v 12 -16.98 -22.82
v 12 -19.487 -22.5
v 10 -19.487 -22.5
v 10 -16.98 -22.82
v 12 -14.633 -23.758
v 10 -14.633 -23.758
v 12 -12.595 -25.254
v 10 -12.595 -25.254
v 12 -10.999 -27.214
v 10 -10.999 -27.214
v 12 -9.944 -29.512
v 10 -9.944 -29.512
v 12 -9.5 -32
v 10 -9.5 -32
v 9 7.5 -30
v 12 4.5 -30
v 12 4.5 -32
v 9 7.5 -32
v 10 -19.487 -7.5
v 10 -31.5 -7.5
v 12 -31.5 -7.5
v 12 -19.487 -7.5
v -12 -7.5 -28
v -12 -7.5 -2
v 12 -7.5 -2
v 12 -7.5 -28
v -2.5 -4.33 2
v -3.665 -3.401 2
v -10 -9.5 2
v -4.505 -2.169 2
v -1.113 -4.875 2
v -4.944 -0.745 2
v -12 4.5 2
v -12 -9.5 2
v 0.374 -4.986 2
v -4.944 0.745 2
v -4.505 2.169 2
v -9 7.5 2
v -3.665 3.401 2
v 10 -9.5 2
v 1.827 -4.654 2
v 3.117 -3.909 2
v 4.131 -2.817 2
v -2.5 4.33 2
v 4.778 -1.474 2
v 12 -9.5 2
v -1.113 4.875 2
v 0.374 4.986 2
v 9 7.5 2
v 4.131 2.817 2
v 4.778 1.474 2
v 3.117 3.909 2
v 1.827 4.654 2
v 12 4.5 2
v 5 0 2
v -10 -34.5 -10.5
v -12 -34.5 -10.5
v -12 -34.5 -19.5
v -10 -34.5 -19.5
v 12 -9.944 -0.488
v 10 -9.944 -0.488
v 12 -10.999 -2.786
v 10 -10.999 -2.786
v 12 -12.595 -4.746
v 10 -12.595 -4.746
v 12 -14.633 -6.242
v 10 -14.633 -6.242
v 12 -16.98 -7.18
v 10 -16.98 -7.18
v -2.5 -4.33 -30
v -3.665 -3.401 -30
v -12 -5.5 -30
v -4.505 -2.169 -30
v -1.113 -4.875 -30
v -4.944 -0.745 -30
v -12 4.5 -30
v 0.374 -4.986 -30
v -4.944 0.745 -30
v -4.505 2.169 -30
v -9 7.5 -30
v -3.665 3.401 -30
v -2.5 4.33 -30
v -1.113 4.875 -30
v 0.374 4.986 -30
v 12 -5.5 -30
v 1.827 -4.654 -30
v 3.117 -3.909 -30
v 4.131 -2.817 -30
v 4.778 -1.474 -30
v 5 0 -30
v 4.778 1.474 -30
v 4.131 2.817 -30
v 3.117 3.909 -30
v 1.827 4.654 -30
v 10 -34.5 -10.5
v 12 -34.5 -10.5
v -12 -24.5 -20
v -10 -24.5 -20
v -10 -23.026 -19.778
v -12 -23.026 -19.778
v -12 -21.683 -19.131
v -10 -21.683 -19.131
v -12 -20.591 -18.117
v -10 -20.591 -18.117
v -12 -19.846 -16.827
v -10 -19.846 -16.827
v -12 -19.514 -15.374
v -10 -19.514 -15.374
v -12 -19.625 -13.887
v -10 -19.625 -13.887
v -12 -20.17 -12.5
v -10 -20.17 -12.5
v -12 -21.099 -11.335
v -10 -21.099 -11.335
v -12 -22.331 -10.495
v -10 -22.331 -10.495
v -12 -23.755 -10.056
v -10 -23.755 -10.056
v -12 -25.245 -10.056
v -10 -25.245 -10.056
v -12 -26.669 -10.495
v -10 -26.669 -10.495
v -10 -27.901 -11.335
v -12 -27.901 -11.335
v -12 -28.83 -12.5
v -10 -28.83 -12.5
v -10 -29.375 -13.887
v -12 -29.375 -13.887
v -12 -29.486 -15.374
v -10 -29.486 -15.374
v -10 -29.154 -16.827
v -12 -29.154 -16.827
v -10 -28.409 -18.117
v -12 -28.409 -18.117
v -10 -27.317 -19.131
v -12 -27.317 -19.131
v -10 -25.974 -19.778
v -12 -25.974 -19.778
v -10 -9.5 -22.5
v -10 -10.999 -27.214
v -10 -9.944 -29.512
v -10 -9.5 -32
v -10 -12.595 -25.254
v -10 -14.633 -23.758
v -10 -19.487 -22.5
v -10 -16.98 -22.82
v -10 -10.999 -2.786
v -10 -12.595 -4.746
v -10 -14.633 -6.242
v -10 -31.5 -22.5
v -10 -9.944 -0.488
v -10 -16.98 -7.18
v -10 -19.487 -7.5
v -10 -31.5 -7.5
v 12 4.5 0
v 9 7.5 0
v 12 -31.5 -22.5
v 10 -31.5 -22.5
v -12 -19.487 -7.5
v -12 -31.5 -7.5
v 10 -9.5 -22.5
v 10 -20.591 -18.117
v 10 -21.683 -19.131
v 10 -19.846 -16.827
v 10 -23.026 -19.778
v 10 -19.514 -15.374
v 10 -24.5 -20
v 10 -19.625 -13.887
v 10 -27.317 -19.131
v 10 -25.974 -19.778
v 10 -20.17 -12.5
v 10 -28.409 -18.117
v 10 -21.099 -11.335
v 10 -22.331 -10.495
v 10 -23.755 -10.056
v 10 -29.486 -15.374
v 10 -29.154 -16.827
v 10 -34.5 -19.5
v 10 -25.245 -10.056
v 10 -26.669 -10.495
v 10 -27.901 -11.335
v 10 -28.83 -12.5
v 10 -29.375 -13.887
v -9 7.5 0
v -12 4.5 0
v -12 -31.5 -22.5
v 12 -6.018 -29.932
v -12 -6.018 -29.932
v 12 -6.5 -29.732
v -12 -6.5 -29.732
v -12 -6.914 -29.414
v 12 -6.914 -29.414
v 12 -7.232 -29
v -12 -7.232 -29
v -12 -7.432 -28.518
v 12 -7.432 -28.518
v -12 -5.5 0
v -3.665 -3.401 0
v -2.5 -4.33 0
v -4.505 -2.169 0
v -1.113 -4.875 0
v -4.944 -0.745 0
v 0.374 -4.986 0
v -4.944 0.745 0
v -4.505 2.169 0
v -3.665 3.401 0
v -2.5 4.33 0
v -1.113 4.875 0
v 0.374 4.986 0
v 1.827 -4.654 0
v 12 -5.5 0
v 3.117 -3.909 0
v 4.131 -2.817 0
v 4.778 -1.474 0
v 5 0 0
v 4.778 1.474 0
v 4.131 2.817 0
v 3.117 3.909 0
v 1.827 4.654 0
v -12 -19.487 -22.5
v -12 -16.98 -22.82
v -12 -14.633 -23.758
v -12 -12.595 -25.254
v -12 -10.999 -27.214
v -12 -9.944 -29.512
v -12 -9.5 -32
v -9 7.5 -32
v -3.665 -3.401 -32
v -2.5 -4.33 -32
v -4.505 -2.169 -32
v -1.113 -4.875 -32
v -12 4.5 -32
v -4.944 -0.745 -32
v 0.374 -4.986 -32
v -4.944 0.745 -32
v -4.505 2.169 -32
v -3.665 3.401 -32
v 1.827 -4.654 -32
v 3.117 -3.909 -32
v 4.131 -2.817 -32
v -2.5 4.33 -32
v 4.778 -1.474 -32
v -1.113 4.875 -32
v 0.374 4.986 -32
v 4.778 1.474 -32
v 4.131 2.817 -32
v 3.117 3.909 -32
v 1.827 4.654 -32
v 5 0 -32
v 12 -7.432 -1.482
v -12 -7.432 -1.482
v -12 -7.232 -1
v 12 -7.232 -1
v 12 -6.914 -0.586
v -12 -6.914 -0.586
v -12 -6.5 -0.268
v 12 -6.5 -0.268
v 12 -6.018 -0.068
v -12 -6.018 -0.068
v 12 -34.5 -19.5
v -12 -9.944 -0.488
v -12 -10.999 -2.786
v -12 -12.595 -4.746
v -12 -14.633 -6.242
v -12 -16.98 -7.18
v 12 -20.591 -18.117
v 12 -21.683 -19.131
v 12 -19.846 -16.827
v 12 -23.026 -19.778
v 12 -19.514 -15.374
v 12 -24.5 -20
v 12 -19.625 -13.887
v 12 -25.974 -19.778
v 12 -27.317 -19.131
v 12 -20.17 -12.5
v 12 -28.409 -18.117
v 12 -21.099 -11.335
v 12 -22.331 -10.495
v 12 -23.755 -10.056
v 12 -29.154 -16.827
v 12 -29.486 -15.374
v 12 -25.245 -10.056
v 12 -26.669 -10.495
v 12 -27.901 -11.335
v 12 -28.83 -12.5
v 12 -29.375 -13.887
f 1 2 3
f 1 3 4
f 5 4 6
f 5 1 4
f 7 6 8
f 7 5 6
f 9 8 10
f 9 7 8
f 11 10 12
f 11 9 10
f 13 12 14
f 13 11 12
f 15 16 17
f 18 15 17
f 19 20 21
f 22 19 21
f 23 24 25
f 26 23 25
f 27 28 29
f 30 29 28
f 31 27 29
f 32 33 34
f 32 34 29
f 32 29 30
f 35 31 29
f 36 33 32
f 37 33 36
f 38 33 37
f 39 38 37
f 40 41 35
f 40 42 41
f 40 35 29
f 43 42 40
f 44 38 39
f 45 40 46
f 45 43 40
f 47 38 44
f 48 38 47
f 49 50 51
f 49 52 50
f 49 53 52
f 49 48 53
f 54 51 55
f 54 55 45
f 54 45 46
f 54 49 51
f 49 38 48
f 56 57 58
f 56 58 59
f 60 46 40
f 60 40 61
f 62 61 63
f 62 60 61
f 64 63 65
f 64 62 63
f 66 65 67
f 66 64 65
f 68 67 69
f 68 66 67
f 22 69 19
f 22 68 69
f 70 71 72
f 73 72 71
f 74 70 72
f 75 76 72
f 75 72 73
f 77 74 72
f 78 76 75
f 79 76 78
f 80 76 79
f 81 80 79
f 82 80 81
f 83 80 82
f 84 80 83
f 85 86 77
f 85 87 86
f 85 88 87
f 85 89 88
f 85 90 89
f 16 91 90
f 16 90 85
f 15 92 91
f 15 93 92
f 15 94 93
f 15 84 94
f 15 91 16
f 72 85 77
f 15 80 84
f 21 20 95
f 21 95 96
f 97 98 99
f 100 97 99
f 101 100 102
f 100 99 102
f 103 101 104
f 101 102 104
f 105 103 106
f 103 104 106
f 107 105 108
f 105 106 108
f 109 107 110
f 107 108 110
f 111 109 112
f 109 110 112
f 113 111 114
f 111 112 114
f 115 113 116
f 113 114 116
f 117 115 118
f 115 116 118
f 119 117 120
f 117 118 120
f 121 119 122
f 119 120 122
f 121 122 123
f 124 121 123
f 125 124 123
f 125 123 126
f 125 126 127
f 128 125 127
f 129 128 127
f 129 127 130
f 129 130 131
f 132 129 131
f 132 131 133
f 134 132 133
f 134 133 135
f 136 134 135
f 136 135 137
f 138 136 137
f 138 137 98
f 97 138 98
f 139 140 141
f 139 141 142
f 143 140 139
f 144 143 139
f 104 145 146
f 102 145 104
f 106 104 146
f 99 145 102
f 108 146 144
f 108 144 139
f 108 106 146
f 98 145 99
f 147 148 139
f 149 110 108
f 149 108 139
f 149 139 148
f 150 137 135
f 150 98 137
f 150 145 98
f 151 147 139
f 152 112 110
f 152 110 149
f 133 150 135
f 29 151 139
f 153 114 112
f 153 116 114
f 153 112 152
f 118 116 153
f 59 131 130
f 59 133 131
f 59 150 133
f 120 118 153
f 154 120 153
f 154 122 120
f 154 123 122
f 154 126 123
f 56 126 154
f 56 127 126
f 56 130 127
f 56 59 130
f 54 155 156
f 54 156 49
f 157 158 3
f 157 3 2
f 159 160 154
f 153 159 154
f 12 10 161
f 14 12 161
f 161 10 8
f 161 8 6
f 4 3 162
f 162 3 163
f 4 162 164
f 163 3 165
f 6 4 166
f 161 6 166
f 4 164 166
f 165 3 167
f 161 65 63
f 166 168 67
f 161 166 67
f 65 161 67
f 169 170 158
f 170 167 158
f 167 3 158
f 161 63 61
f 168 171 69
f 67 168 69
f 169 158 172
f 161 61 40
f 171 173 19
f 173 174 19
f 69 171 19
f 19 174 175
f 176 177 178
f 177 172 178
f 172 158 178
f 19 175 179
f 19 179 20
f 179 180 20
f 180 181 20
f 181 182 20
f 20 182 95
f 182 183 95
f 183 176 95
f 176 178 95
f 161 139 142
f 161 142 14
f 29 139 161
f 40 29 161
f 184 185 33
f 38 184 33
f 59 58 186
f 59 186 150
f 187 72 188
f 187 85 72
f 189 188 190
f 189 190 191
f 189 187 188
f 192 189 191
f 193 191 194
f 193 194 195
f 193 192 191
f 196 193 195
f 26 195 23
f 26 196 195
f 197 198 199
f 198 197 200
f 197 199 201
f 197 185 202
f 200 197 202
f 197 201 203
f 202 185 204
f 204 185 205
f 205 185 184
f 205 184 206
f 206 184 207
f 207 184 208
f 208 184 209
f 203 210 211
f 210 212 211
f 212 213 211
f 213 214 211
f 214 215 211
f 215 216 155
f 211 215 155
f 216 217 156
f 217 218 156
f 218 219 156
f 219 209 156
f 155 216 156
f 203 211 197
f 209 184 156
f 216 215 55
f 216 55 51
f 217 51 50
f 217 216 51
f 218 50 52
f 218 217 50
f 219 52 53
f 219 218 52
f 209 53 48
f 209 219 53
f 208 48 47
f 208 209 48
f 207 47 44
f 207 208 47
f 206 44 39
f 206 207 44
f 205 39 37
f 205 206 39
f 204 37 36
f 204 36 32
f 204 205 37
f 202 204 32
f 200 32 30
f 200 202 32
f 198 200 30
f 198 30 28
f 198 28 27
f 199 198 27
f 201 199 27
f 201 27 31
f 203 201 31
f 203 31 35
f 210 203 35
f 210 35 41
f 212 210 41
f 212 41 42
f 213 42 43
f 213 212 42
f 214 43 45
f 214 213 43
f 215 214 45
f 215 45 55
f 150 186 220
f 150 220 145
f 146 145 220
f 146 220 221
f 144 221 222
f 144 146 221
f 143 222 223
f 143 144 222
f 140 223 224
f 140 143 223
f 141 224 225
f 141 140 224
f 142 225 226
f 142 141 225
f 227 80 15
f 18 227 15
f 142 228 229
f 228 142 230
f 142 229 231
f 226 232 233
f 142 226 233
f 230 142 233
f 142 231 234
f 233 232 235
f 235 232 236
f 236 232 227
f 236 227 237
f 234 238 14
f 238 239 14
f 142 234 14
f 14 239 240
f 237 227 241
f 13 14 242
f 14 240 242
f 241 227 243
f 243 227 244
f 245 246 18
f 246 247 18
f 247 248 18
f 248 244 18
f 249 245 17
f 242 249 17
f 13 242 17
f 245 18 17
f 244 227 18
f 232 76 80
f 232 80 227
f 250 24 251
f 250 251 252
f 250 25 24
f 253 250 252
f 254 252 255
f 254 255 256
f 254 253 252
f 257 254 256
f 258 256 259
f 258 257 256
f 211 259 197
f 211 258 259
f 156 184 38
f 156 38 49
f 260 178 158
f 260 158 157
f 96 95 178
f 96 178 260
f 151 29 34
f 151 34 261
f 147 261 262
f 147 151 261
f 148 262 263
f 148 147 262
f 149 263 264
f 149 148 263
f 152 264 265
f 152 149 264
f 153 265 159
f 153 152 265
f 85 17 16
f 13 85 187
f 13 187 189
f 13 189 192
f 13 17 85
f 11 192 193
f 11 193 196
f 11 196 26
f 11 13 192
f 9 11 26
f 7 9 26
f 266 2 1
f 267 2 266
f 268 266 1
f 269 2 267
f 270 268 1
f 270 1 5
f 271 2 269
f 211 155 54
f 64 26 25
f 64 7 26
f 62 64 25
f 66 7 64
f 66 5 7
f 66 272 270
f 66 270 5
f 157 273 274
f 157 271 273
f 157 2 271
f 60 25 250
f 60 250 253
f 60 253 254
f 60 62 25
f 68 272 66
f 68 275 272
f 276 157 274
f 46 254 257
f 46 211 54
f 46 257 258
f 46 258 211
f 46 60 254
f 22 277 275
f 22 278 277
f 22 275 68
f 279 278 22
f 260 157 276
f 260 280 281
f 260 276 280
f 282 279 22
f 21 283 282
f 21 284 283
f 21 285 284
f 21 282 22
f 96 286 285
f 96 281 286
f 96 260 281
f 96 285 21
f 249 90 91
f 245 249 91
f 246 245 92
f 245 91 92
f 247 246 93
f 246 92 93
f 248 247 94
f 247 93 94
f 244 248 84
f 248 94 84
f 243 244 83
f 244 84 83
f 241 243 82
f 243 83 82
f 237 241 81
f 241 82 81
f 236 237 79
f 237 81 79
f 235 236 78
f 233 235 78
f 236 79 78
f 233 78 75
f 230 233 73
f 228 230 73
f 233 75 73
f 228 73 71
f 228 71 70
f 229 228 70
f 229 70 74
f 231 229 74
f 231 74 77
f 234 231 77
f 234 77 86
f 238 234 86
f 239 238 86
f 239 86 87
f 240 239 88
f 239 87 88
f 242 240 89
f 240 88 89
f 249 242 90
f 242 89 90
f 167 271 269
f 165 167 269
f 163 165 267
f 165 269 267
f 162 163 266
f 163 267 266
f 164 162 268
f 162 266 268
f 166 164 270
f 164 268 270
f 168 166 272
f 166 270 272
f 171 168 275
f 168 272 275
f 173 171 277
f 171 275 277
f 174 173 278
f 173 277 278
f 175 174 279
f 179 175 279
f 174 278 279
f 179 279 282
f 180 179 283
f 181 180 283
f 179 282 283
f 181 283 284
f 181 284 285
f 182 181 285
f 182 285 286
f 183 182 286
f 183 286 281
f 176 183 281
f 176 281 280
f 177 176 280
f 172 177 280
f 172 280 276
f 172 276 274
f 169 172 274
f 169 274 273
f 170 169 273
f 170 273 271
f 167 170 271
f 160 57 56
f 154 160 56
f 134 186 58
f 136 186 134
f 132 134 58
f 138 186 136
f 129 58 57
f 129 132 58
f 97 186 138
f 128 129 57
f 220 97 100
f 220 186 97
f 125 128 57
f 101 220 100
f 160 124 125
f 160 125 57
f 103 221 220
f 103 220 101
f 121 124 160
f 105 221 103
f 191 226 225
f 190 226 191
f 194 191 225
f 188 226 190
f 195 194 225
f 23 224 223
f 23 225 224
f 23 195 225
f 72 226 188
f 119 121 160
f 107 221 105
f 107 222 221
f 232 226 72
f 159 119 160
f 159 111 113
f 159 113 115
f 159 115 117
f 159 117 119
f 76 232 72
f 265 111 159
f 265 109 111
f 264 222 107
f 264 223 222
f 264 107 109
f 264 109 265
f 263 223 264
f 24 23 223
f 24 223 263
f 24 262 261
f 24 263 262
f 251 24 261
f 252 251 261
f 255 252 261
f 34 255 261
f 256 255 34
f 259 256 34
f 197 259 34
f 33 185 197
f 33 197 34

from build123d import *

# Parameters (mm, degrees)
SKETCH1_W           = 24
SKETCH1_H           = 15
SKETCH1_R           = 5
SKETCH1_H_2         = 2
BOSS_EXTRUDE1_DEPTH = 2
SKETCH1_3_W         = 24
SKETCH1_3_H         = 2
BOSS_EXTRUDE2_DEPTH = 30
SKETCH3_W           = 2
SKETCH3_H           = 34
BOSS_EXTRUDE3_DEPTH = 25
SKETCH4_W           = 2
SKETCH4_H           = 9.5
CUT_EXTRUDE1_DEPTH  = 25
SKETCH5_R           = 5
CUT_EXTRUDE2_DEPTH  = 64.437930135
FILLET1_R           = 10
FILLET2_R           = 2
CHAMFER1_SIZE       = 3


with BuildPart() as part:
    # Sketch1 → Boss-Extrude1 (new body)
    # profile 1 of 2: a face of its own
    with BuildSketch(Plane.XY):
        Rectangle(SKETCH1_W, SKETCH1_H)
        Circle(SKETCH1_R, mode=Mode.SUBTRACT)
    # profile 2 of 2: a face of its own
    with BuildSketch(Plane.XY):
        with Locations((0, -8.5)):
            Rectangle(SKETCH1_W, SKETCH1_H_2)
    boss_extrude1 = extrude(amount=BOSS_EXTRUDE1_DEPTH)

    # Sketch1<3> → Boss-Extrude2 (add)
    with BuildSketch(Plane.XY):
        with Locations((0, -8.5)):
            Rectangle(SKETCH1_3_W, SKETCH1_3_H)
    extrude(amount=-BOSS_EXTRUDE2_DEPTH)

    # Mirror1: Boss-Extrude1 across plane
    add(boss_extrude1.mirror(Plane(origin=(0, 0, -15), x_dir=(1, 0, 0), z_dir=(0, 0, -1))))

    # Sketch3 → Boss-Extrude3 (add)
    with BuildSketch(Plane.XZ.offset(9.5)):
        with Locations((-11, -15)):
            Rectangle(SKETCH3_W, SKETCH3_H)
        with Locations((11, -15)):
            Rectangle(SKETCH3_W, SKETCH3_H)
    extrude(amount=BOSS_EXTRUDE3_DEPTH)

    # Sketch4 → Cut-Extrude1 (cut)
    with BuildSketch(Plane.XZ.offset(34.5)):
        with Locations((-11, -27.25)):
            Rectangle(SKETCH4_W, SKETCH4_H)
        with Locations((-11, -2.75)):
            Rectangle(SKETCH4_W, SKETCH4_H)
        with Locations((11, -2.75)):
            Rectangle(SKETCH4_W, SKETCH4_H)
        with Locations((11, -27.25)):
            Rectangle(SKETCH4_W, SKETCH4_H)
    extrude(amount=-CUT_EXTRUDE1_DEPTH, mode=Mode.SUBTRACT)

    # Sketch5 → Cut-Extrude2 (cut)
    with BuildSketch(Plane(origin=(12, 0, 0), x_dir=(0, 0, -1), z_dir=(1, 0, 0))):
        with Locations((15, -24.5)):
            Circle(SKETCH5_R)
    extrude(amount=-CUT_EXTRUDE2_DEPTH, mode=Mode.SUBTRACT)

    # Fillet1
    # the kernel refuses this fillet: 10 mm, written as the material it adds along each edge
    with BuildSketch(Plane(origin=(12, -9.5, -7.5), x_dir=(0, 0, 1), z_dir=(-1, 0, 0)), Plane(origin=(-10, -9.5, -7.5), x_dir=(0, 0, 1), z_dir=(-1, 0, 0))) as fillet1_piece_1:
        with BuildLine():
            CenterArc((10, -9.987492178), FILLET1_R, 92.865983983, 87.134016017)
            Line((0, -9.987492178), (-0.2, -9.987492178))
            Line((-0.2, -9.987492178), (-0.2, 0))
            Line((-0.2, 0), (0, 0.2))
            ThreePointArc((0, 0.2), (4.75, 0.2), (9.49, 0.199749844))
            Line((9.49, 0.199749844), (9.5, 0))
        make_face()
    extrude(amount=2)
    with BuildSketch(Plane(origin=(12, -9.5, -7.5), x_dir=(0, 0, 1), z_dir=(-1, 0, 0))) as fillet1_piece_2_section:
        with BuildLine():
            CenterArc((10, -9.987492178), FILLET1_R, 92.865983983, 87.134016017)
            Line((0, -9.987492178), (-0.2, -9.987492178))
            Line((-0.2, -9.987492178), (-0.2, 0))
            Line((-0.2, 0), (0, 0.2))
            ThreePointArc((0, 0.2), (4.75, 0.2), (9.49, 0.199749844))
            Line((9.49, 0.199749844), (9.5, 0))
        make_face()
    fillet1_piece_2 = extrude(amount=26.968730444, mode=Mode.PRIVATE)
    fillet1_piece_2 = split(fillet1_piece_2, bisect_by=Plane(origin=(-12, -11.774818107, -5.276261627), z_dir=(1, 0, 0)), keep=Keep.TOP, mode=Mode.PRIVATE)
    fillet1_piece_2 = split(fillet1_piece_2, bisect_by=Plane(origin=(-10, -11.774818107, -5.276261627), z_dir=(-1, 0, 0)), keep=Keep.TOP, mode=Mode.PRIVATE)
    add(fillet1_piece_2)
    with BuildSketch(Plane(origin=(12, -9.5, -22.5), x_dir=(0, 0, -1), z_dir=(-1, 0, 0)), Plane(origin=(-10, -9.5, -22.5), x_dir=(0, 0, -1), z_dir=(-1, 0, 0))) as fillet1_piece_3:
        with BuildLine():
            CenterArc((10, 9.987492178), FILLET1_R, 180, 87.134016017)
            Line((0, 9.987492178), (-0.2, 9.987492178))
            Line((-0.2, 9.987492178), (-0.2, 0))
            Line((-0.2, 0), (0, -0.2))
            ThreePointArc((0, -0.2), (4.75, -0.2), (9.49, -0.199749844))
            Line((9.49, -0.199749844), (9.5, 0))
        make_face()
    extrude(amount=2)
    with BuildSketch(Plane(origin=(12, -9.5, -22.5), x_dir=(0, 0, -1), z_dir=(-1, 0, 0))) as fillet1_piece_4_section:
        with BuildLine():
            CenterArc((10, 9.987492178), FILLET1_R, 180, 87.134016017)
            Line((0, 9.987492178), (-0.2, 9.987492178))
            Line((-0.2, 9.987492178), (-0.2, 0))
            Line((-0.2, 0), (0, -0.2))
            ThreePointArc((0, -0.2), (4.75, -0.2), (9.49, -0.199749844))
            Line((9.49, -0.199749844), (9.5, 0))
        make_face()
    fillet1_piece_4 = extrude(amount=26.968730444, mode=Mode.PRIVATE)
    fillet1_piece_4 = split(fillet1_piece_4, bisect_by=Plane(origin=(-12, -11.774818107, -24.723738373), z_dir=(1, 0, 0)), keep=Keep.TOP, mode=Mode.PRIVATE)
    fillet1_piece_4 = split(fillet1_piece_4, bisect_by=Plane(origin=(-10, -11.774818107, -24.723738373), z_dir=(-1, 0, 0)), keep=Keep.TOP, mode=Mode.PRIVATE)
    add(fillet1_piece_4)
    with BuildSketch(Plane(origin=(14.968730444, -9.5, -22.5), x_dir=(0, 0, -1), z_dir=(-1, 0, 0))) as fillet1_piece_5_section:
        with BuildLine():
            CenterArc((10, 9.987492178), FILLET1_R, 180, 87.134016017)
            Line((0, 9.987492178), (-0.2, 9.987492178))
            Line((-0.2, 9.987492178), (-0.2, 0))
            Line((-0.2, 0), (0, -0.2))
            ThreePointArc((0, -0.2), (4.75, -0.2), (9.49, -0.199749844))
            Line((9.49, -0.199749844), (9.5, 0))
        make_face()
    fillet1_piece_5 = extrude(amount=26.968730444, mode=Mode.PRIVATE)
    fillet1_piece_5 = split(fillet1_piece_5, bisect_by=Plane(origin=(12, -11.774818107, -24.723738373), z_dir=(-1, 0, 0)), keep=Keep.TOP, mode=Mode.PRIVATE)
    fillet1_piece_5 = split(fillet1_piece_5, bisect_by=Plane(origin=(10, -11.774818107, -24.723738373), z_dir=(1, 0, 0)), keep=Keep.TOP, mode=Mode.PRIVATE)
    add(fillet1_piece_5)
    with BuildSketch(Plane(origin=(14.968730444, -9.5, -7.5), x_dir=(0, 0, 1), z_dir=(-1, 0, 0))) as fillet1_piece_6_section:
        with BuildLine():
            CenterArc((10, -9.987492178), FILLET1_R, 92.865983983, 87.134016017)
            Line((0, -9.987492178), (-0.2, -9.987492178))
            Line((-0.2, -9.987492178), (-0.2, 0))
            Line((-0.2, 0), (0, 0.2))
            ThreePointArc((0, 0.2), (4.75, 0.2), (9.49, 0.199749844))
            Line((9.49, 0.199749844), (9.5, 0))
        make_face()
    fillet1_piece_6 = extrude(amount=26.968730444, mode=Mode.PRIVATE)
    fillet1_piece_6 = split(fillet1_piece_6, bisect_by=Plane(origin=(12, -11.774818107, -5.276261627), z_dir=(-1, 0, 0)), keep=Keep.TOP, mode=Mode.PRIVATE)
    fillet1_piece_6 = split(fillet1_piece_6, bisect_by=Plane(origin=(10, -11.774818107, -5.276261627), z_dir=(1, 0, 0)), keep=Keep.TOP, mode=Mode.PRIVATE)
    add(fillet1_piece_6)

    # Fillet2
    fillet2_edges = [part.edges().sort_by_distance(p)[0] for p in [
        (0, -7.5, 0),
        (0, -7.5, -30),
    ]]
    fillet(fillet2_edges, radius=FILLET2_R)

    # Chamfer1
    chamfer1_edges = [part.edges().sort_by_distance(p)[0] for p in [
        (-11, -34.5, -7.5),
        (-12, 7.5, 1),
        (12, 7.5, 1),
        (-11, -34.5, -22.5),
        (-12, 7.5, -31),
        (12, 7.5, -31),
        (11, -34.5, -22.5),
        (11, -34.5, -7.5),
    ]]
    chamfer(chamfer1_edges, length=CHAMFER1_SIZE)


solid = part.part
